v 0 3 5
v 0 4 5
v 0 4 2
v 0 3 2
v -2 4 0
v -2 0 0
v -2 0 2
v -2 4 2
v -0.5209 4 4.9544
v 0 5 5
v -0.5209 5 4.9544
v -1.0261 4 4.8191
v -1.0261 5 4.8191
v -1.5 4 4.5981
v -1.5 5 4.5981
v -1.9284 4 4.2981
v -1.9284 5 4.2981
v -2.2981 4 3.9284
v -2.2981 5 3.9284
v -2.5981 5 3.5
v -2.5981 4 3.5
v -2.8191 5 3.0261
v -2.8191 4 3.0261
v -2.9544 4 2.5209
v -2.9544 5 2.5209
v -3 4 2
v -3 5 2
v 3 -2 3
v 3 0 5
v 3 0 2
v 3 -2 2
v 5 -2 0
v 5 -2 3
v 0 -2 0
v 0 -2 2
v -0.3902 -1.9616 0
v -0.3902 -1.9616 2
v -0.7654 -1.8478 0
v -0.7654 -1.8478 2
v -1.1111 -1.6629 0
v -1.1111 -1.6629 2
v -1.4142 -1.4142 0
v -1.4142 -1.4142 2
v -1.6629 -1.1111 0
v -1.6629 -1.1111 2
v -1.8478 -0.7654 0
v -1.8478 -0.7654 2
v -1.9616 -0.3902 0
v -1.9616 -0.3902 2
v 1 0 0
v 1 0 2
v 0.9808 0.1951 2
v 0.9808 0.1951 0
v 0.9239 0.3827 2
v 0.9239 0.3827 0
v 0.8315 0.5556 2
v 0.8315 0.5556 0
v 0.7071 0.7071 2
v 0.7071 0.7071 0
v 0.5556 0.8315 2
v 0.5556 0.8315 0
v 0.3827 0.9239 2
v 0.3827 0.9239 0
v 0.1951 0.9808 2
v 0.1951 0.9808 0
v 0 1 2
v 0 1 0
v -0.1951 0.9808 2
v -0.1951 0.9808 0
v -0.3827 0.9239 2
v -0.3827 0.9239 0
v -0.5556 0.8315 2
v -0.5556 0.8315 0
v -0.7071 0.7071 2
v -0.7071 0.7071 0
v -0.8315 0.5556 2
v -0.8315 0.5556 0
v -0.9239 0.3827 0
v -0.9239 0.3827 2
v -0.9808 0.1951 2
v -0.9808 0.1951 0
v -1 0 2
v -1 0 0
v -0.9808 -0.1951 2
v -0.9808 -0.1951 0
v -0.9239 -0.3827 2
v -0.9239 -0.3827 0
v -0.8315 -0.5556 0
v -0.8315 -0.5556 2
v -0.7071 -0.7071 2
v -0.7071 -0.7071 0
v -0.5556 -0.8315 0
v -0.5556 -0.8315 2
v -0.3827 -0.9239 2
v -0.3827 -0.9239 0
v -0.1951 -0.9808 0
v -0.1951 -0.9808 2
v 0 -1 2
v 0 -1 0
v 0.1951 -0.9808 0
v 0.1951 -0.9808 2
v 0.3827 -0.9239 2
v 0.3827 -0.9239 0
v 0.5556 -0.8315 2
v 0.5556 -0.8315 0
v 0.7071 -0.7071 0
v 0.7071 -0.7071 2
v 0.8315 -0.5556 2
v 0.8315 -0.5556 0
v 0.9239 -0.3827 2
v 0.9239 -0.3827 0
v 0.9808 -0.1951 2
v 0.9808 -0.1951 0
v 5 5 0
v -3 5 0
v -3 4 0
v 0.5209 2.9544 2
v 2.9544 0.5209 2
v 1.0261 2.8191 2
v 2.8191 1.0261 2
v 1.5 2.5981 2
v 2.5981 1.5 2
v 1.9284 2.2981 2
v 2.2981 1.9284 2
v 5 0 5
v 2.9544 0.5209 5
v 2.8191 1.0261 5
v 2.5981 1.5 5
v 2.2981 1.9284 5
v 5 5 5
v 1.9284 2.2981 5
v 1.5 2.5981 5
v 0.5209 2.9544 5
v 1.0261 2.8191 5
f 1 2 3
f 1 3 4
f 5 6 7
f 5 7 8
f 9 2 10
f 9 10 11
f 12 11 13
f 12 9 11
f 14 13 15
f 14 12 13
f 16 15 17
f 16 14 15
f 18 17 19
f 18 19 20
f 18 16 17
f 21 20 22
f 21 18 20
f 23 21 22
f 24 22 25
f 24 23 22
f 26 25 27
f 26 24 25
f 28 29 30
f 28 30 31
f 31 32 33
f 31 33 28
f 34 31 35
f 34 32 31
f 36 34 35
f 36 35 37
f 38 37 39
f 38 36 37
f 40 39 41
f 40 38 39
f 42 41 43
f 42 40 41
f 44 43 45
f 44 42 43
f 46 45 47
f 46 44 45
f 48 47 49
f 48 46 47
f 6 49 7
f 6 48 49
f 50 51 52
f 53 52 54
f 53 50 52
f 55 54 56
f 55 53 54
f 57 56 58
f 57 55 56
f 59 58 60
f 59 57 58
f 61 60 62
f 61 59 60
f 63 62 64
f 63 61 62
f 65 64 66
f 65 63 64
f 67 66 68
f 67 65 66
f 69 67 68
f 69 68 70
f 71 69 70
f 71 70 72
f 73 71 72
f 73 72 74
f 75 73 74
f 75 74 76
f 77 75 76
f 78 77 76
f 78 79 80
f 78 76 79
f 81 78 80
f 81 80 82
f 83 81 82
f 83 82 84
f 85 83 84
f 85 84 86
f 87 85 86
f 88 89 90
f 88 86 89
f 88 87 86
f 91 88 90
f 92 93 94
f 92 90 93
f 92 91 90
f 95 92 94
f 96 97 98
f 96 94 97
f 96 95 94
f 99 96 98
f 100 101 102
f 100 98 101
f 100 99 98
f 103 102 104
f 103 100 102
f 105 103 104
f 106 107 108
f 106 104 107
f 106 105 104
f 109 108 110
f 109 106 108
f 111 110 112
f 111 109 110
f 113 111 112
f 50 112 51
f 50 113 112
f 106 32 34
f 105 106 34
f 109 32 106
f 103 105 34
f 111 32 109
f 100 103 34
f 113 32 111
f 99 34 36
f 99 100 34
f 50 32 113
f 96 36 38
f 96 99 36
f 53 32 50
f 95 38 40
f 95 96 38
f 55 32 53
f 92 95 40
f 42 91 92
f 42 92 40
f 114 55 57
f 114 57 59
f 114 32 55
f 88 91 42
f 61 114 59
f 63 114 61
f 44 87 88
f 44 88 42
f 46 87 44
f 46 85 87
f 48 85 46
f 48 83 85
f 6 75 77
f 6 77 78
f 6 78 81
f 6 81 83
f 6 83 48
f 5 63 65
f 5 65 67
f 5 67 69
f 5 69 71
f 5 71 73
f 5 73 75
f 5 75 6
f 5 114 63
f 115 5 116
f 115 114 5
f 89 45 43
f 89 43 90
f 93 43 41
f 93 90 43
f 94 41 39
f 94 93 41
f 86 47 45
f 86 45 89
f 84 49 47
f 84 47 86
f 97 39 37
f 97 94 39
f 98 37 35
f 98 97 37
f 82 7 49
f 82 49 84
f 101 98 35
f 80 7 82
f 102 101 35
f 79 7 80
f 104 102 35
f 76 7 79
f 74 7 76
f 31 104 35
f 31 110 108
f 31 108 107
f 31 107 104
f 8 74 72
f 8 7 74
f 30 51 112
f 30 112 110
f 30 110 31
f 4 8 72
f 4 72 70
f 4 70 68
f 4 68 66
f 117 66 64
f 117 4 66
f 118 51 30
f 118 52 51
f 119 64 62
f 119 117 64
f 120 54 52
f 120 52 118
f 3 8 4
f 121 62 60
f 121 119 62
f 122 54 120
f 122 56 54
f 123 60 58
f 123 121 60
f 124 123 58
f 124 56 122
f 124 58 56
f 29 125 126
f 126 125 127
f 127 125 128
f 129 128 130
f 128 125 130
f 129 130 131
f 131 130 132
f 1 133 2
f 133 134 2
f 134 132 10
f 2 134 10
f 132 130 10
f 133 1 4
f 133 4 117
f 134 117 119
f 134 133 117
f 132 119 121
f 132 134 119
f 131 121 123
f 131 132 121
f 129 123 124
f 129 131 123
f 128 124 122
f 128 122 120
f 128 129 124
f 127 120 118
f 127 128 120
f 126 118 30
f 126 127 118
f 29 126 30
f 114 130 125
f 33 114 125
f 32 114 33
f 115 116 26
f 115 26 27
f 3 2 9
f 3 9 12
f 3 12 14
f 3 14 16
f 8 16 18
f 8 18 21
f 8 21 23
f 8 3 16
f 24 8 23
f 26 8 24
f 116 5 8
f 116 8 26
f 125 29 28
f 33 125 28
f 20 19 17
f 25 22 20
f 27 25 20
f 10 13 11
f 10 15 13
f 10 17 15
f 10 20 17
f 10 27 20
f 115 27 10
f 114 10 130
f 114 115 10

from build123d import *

# Parameters (mm, degrees)
SKETCH1_R           = 1
BOSS_EXTRUDE1_DEPTH = 5
SKETCH2_OUTSIDE_W   = 12.35
SKETCH2_OUTSIDE_H   = 11.35
CUT_EXTRUDE1_DEPTH  = 3
CUT_EXTRUDE2_DEPTH  = 3
CUT_EXTRUDE3_DEPTH  = 3


with BuildPart() as part:
    # Sketch1 → Boss-Extrude1 (new body)
    with BuildSketch(Plane.XY):
        with BuildLine():
            Line((-2, 0), (-2, 4))
            Line((-2, 4), (-3, 4))
            Line((-3, 4), (-3, 5))
            Line((-3, 5), (5, 5))
            Line((5, 5), (5, -2))
            Line((5, -2), (0, -2))
            ThreePointArc((0, -2), (-1.414213562, -1.414213562), (-2, 0))
        make_face()
        Circle(SKETCH1_R, mode=Mode.SUBTRACT)
    extrude(amount=BOSS_EXTRUDE1_DEPTH)

    # Sketch2 outside → Cut-Extrude1 (cut)
    with BuildSketch(Plane.XY.offset(5)):
        with Locations((1, 1.5)):
            Rectangle(SKETCH2_OUTSIDE_W, SKETCH2_OUTSIDE_H)
        with BuildLine():
            Line((5, -2), (5, 5))
            Line((5, 5), (-3, 5))
            Line((-3, 5), (-3, 4))
            Line((-3, 4), (-2, 4))
            Line((-2, 4), (0, 4))
            Line((0, 4), (0, 3))
            ThreePointArc((0, 3), (2.121320344, 2.121320344), (3, 0))
            Line((3, 0), (3, -2))
            Line((3, -2), (5, -2))
        make_face(mode=Mode.SUBTRACT)
    extrude(amount=-CUT_EXTRUDE1_DEPTH, mode=Mode.SUBTRACT)

    # Sketch3 → Cut-Extrude2 (cut)
    with BuildSketch(Plane.XZ.offset(-4)):
        with BuildLine():
            Line((-3, 2), (-3, 5))
            Line((-3, 5), (0, 5))
            ThreePointArc((0, 5), (-2.121320344, 4.121320344), (-3, 2))
        make_face()
    extrude(amount=-CUT_EXTRUDE2_DEPTH, mode=Mode.SUBTRACT)

    # Sketch4 → Cut-Extrude3 (cut, through all)
    with BuildSketch(Plane.ZY.offset(-3)):
        Polygon((5, 0), (3, -2), (5, -2), align=None)
    extrude(amount=-CUT_EXTRUDE3_DEPTH, mode=Mode.SUBTRACT)


solid = part.part
